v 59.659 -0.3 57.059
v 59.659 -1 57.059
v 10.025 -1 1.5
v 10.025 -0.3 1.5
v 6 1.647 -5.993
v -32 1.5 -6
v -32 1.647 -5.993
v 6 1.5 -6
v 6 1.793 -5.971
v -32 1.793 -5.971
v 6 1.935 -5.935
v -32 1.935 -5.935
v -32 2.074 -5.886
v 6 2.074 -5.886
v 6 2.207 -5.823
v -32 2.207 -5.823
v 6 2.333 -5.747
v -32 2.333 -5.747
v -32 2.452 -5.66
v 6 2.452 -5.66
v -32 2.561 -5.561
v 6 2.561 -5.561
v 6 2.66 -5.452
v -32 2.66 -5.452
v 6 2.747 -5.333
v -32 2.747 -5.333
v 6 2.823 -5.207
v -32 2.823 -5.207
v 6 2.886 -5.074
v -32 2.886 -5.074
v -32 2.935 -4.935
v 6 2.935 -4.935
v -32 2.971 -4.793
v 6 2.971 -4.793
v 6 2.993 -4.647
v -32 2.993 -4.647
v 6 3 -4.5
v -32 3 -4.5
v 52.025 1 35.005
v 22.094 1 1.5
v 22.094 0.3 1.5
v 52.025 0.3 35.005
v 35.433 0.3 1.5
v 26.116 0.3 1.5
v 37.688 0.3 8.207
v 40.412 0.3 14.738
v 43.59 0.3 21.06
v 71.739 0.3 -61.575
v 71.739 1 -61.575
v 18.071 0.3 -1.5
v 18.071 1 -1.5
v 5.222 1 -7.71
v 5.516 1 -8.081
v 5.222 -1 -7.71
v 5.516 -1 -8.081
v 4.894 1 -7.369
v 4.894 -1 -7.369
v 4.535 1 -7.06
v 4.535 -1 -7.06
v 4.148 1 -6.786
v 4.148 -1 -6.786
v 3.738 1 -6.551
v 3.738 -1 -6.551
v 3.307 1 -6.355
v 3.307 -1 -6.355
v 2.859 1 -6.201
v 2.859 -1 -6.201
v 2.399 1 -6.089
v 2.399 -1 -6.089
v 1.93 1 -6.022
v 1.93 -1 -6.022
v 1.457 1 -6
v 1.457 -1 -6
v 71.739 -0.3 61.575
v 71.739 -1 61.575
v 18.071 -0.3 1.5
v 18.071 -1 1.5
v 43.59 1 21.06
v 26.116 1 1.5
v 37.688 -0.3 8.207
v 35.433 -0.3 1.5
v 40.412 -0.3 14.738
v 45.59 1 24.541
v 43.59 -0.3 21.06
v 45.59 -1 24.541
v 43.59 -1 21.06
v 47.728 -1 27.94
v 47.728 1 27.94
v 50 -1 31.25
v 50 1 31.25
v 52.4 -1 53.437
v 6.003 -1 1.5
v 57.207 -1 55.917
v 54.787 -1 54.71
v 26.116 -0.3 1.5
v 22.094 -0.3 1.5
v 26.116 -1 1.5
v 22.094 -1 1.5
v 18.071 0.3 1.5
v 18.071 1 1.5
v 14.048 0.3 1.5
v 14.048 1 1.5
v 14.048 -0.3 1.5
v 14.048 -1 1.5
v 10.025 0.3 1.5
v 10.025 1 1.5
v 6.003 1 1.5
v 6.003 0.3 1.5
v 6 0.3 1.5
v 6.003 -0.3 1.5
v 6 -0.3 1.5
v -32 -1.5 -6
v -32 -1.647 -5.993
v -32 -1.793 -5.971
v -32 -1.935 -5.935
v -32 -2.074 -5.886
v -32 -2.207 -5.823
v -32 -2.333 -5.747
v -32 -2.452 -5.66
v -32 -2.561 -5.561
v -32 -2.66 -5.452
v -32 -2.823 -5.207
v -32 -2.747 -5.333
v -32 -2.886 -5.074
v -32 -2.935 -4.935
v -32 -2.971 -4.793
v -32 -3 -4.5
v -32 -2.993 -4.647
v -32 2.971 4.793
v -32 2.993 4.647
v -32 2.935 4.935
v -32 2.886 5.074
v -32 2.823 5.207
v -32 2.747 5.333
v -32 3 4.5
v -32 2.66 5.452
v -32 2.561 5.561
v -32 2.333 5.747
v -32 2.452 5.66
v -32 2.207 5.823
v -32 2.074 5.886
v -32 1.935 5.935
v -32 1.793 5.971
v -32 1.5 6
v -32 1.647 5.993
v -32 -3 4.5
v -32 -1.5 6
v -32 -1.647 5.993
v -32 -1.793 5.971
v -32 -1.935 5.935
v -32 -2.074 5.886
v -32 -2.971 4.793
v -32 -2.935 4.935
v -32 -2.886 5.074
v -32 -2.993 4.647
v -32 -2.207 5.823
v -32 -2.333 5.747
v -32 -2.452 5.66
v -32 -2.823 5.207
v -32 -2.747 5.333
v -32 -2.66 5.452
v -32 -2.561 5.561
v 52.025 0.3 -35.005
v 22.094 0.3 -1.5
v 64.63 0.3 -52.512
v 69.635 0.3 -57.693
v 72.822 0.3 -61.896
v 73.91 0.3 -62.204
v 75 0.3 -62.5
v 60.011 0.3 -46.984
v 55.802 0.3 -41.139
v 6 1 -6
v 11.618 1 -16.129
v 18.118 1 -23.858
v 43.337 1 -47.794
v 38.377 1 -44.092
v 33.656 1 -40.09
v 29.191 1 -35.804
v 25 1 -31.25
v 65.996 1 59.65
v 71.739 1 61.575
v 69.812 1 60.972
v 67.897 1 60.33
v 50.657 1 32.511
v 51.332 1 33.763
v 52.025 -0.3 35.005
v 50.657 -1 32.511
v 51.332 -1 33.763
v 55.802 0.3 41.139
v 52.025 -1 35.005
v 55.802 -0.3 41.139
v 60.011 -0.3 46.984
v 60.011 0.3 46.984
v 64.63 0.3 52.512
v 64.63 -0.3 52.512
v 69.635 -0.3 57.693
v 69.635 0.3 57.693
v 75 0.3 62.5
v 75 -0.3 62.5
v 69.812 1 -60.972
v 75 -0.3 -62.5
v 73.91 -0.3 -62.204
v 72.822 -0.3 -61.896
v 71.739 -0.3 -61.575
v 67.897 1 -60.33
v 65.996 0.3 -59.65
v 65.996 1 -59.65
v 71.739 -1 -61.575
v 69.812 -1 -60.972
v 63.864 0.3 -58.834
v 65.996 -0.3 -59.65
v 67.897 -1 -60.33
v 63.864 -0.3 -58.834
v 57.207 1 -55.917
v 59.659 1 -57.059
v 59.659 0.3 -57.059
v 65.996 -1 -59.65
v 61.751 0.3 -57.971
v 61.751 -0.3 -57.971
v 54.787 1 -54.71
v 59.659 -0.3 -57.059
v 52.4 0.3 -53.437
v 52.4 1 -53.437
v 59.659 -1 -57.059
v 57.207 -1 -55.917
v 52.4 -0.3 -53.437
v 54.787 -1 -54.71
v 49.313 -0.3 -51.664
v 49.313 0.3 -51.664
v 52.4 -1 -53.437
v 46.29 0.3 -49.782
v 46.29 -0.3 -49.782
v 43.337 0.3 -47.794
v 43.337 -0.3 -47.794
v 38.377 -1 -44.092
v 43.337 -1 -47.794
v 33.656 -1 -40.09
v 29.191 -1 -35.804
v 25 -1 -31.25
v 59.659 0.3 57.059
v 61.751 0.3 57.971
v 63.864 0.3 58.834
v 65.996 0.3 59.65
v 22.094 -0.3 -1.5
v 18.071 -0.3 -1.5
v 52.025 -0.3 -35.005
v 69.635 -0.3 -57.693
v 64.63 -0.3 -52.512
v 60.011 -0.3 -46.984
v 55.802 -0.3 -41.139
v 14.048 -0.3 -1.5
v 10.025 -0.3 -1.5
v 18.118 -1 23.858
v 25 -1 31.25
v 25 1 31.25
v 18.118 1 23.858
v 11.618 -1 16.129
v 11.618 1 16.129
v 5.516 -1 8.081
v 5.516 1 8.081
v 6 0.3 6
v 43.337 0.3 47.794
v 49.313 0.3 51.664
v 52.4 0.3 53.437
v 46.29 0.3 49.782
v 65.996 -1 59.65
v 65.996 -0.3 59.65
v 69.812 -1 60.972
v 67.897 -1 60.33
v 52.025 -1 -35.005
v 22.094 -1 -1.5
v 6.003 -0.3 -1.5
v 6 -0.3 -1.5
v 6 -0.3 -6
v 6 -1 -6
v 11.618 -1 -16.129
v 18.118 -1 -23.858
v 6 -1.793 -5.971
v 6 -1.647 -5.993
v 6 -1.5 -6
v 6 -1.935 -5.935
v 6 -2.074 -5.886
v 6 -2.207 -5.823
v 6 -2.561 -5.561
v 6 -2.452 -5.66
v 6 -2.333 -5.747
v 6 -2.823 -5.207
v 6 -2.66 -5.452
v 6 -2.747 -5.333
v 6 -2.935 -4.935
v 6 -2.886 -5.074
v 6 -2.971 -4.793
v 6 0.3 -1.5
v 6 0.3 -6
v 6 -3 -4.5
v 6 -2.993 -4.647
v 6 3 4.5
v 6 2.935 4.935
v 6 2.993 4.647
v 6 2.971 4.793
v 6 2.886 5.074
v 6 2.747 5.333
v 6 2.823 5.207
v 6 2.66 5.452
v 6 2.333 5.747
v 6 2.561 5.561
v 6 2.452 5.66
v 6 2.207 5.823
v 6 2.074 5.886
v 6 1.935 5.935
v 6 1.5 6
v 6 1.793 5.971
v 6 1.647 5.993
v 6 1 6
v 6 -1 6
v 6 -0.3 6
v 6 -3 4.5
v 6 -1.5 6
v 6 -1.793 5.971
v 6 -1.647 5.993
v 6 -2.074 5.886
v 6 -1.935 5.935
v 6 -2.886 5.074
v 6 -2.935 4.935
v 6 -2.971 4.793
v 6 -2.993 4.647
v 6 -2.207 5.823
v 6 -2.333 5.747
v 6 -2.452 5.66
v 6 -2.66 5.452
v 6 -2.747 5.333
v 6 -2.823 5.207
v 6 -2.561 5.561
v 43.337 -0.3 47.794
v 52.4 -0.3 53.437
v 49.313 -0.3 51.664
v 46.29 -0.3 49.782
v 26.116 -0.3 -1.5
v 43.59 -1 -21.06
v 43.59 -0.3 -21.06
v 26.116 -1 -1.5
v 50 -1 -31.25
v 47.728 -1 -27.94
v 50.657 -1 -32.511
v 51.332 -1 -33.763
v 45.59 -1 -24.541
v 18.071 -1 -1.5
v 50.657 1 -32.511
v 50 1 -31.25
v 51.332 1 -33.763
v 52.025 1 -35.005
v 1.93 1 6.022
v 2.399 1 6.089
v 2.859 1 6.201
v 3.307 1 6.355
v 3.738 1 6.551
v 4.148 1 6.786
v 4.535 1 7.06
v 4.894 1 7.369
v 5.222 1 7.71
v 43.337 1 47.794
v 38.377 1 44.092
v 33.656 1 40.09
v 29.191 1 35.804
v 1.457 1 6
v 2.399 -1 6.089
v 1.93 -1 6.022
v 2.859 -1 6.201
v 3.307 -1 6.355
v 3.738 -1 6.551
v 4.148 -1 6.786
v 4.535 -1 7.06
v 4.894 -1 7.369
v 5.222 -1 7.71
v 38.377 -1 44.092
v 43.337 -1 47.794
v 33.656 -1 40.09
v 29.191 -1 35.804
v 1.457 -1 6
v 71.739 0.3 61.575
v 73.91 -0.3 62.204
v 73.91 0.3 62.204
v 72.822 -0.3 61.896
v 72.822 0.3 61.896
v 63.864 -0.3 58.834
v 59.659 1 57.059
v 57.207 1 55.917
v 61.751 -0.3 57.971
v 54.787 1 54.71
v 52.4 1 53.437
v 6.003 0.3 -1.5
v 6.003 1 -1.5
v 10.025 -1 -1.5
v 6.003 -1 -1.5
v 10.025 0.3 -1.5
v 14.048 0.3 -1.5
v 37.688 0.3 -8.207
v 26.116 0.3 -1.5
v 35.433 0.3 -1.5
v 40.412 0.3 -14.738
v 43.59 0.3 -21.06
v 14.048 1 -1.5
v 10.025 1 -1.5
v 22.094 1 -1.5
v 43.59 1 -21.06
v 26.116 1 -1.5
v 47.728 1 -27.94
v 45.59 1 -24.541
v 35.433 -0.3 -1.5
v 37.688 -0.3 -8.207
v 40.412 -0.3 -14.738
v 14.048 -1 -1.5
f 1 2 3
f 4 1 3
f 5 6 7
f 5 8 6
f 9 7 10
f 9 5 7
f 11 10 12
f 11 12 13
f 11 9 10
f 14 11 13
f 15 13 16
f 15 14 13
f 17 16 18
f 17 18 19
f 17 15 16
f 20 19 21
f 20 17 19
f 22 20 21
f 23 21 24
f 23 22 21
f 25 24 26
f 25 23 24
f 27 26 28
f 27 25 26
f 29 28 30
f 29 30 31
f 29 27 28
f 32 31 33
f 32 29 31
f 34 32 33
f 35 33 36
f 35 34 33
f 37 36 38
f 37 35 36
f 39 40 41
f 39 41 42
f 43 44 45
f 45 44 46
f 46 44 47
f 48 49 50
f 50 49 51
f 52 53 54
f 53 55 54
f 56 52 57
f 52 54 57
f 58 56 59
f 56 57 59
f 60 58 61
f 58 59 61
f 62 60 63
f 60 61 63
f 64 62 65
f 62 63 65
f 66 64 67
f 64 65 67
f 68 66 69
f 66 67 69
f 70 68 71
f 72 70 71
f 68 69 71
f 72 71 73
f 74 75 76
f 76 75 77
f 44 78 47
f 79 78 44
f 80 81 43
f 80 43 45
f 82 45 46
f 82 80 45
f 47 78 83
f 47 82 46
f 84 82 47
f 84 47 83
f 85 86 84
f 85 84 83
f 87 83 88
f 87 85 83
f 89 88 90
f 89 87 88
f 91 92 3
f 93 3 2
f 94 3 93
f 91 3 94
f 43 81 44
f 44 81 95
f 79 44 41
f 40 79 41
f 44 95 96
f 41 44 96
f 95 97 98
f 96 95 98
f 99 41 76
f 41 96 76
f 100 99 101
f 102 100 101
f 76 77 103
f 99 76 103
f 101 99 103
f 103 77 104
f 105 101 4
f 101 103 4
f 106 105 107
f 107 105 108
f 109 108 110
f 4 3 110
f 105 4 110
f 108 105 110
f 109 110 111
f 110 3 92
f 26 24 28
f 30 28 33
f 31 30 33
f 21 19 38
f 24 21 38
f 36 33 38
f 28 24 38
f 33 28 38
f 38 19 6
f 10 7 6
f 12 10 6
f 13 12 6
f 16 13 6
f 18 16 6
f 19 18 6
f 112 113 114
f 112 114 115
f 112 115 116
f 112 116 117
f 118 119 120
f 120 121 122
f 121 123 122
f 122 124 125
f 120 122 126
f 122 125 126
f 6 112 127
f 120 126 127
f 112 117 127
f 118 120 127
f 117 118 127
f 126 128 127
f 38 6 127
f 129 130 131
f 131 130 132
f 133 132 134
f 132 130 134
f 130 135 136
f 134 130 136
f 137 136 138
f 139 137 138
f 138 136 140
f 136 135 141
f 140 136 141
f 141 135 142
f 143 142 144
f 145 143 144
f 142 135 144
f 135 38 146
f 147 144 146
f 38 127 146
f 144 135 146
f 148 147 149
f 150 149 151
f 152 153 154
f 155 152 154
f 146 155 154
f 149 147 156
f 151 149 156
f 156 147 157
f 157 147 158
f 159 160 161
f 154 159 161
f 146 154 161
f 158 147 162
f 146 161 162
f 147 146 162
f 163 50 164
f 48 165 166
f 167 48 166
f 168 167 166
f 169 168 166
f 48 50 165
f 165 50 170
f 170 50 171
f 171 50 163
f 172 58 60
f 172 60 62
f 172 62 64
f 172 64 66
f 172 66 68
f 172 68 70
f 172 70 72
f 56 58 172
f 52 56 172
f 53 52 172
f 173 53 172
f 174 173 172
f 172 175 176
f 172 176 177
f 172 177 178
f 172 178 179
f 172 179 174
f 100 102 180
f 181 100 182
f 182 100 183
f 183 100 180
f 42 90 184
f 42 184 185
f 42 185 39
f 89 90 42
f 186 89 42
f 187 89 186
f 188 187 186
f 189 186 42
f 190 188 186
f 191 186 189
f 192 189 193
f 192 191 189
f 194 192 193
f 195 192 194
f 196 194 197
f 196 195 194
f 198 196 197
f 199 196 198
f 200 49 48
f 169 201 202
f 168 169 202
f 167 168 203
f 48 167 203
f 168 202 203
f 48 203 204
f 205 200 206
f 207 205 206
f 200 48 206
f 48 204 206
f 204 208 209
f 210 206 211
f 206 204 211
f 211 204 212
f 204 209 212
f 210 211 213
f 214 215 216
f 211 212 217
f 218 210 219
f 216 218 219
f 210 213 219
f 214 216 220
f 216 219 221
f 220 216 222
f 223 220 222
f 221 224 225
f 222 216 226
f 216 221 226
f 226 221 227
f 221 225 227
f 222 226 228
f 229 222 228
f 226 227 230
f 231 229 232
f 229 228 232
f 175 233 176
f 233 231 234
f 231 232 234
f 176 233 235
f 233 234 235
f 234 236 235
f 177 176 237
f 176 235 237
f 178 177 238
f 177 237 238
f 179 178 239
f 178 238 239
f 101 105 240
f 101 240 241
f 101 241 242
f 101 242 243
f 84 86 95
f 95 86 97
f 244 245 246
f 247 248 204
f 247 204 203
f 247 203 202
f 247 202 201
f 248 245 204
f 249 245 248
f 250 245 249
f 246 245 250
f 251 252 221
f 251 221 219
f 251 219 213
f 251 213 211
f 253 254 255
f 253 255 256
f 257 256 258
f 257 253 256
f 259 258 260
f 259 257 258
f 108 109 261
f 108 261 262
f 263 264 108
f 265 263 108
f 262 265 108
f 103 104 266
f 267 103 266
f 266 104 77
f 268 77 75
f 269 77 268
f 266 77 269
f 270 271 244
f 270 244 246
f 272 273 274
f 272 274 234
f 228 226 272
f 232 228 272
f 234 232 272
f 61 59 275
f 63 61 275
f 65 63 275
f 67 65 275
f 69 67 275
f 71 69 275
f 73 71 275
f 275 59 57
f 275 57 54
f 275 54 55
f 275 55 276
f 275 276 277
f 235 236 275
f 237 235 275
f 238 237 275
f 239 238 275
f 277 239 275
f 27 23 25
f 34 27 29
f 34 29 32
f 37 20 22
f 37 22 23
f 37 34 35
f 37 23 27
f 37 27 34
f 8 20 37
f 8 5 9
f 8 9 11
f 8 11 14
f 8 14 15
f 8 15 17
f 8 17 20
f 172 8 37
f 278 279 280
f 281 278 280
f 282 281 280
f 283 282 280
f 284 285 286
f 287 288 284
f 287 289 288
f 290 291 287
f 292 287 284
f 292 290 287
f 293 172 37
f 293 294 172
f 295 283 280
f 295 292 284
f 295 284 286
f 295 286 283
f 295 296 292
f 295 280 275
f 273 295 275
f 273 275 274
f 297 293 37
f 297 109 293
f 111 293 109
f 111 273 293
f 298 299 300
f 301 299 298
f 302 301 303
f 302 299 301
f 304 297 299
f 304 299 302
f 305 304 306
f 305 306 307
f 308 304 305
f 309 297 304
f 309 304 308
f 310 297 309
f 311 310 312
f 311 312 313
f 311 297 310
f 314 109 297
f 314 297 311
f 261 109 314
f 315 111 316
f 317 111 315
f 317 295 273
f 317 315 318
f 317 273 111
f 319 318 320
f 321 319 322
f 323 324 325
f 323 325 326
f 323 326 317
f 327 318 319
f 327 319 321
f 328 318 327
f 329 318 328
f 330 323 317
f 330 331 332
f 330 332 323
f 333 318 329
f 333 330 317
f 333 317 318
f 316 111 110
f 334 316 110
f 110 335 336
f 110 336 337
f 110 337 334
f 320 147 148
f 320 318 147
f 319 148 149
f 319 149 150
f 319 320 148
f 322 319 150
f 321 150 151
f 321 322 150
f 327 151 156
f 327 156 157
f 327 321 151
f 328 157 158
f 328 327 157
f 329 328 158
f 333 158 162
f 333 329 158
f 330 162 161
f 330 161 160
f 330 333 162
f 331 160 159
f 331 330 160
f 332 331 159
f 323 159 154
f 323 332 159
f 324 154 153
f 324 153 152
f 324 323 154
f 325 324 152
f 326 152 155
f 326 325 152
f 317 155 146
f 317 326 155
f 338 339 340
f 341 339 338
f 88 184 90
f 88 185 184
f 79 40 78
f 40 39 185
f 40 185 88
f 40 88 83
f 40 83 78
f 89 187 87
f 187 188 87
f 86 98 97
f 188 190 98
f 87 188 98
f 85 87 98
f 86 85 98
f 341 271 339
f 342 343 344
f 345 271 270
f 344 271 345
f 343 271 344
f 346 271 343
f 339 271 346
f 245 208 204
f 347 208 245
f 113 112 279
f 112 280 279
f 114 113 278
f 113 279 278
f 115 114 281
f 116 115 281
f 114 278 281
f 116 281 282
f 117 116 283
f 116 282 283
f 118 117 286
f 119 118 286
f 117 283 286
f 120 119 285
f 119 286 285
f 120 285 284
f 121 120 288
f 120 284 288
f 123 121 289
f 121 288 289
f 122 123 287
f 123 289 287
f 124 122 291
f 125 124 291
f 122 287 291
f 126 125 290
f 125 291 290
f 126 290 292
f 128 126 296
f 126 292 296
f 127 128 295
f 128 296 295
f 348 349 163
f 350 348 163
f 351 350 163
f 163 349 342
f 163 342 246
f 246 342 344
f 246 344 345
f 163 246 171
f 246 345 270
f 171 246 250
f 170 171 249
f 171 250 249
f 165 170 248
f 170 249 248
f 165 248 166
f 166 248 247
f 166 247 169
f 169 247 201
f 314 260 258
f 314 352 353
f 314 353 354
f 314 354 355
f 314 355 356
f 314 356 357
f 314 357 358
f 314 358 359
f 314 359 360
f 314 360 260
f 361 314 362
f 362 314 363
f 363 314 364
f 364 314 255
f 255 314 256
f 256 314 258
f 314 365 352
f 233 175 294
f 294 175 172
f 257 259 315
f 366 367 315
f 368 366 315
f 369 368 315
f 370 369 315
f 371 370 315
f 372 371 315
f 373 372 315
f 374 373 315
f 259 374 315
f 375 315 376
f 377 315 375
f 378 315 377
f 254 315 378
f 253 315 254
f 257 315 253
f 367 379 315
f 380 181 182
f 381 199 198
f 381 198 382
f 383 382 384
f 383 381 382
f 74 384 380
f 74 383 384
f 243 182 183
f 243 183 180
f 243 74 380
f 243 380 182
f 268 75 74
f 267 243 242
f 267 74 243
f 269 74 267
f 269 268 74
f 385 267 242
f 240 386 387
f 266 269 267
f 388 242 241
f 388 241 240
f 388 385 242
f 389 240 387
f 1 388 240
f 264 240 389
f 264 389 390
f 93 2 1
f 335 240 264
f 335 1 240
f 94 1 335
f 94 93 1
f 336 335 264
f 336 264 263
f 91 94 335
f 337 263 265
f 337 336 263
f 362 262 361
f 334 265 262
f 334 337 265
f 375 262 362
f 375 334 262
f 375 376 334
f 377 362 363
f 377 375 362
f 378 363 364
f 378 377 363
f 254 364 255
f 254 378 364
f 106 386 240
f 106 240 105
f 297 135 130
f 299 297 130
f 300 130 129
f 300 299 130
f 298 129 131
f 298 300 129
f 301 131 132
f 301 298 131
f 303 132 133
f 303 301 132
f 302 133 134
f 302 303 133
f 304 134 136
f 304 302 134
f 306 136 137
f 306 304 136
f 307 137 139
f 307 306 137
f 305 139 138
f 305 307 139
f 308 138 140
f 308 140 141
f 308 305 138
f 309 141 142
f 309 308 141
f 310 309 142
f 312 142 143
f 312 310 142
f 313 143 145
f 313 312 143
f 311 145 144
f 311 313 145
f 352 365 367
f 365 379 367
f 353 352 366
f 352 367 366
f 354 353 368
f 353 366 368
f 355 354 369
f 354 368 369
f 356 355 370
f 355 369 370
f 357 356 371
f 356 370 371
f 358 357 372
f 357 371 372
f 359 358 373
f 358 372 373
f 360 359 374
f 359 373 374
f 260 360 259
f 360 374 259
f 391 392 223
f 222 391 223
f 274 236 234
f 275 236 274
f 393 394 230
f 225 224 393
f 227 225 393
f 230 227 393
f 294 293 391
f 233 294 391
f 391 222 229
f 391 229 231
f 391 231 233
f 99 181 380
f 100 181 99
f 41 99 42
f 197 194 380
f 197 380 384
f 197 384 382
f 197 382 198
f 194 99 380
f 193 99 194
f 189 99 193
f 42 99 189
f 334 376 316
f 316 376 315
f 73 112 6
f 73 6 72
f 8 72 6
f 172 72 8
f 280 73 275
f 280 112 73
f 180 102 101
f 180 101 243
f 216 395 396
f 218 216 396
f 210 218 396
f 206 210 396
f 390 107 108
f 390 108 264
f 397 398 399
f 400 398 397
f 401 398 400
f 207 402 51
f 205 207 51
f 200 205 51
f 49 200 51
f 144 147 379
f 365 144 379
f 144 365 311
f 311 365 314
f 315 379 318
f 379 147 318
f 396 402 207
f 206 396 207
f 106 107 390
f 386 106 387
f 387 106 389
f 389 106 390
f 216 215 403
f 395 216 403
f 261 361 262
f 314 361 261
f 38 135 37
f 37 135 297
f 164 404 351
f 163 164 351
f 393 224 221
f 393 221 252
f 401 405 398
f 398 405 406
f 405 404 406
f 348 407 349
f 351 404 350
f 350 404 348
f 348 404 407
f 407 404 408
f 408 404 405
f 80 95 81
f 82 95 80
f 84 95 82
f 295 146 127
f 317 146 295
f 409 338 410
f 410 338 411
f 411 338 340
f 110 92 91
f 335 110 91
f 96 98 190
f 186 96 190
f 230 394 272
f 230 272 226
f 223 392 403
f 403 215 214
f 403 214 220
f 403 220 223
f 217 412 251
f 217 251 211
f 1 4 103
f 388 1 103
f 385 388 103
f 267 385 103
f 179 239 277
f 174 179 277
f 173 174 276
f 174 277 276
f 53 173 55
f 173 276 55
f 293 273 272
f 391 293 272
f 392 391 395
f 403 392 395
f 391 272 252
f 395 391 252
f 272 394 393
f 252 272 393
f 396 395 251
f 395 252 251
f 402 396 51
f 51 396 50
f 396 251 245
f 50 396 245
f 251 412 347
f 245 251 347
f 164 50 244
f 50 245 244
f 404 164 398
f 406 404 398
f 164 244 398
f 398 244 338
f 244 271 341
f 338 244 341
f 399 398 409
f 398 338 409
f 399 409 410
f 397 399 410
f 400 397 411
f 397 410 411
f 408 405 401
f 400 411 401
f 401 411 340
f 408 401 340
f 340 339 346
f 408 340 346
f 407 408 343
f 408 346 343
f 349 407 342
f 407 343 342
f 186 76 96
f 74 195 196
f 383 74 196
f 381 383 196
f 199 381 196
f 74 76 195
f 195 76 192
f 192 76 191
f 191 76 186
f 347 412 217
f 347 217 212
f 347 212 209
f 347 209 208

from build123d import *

# Parameters (mm, degrees)
F1_DEPTH         = 1
F3_W             = 38
F3_H             = 12
F4_DEPTH         = 3
F5_R             = 1.5
F7_DEPTH         = 0.7
F7_COPIES2_COUNT = 2
F9_DEPTH         = 12.5
F10_R            = 5


# Not quite as in the source:
# - a pattern or mirror of a feature is missing from the dataset's text; its kind, count and spacing are read off the source's solid


with BuildPart() as f1:
    # F0 (on Front) → F1 (new body, symmetric)
    with BuildSketch(Plane.XZ):
        with BuildLine():
            ThreePointArc((25, 31.25), (11.7164027855, 16.2518777716), (0, 0))
            Line((0, 0), (35, 0))
            ThreePointArc((35, 0), (41.1356304071, 16.2798974046), (50, 31.25))
            Line((50, 31.25), (25, 31.25))
        make_face()
        with BuildLine():
            ThreePointArc((75, 62.5), (47.6444357815, 50.6439027497), (25, 31.25))
            Line((25, 31.25), (50, 31.25))
            ThreePointArc((50, 31.25), (60.9207680237, 48.138385581), (75, 62.5))
        make_face()
    extrude(amount=F1_DEPTH, both=True)

    # F2: F1 across plane


with BuildPart() as f1_1:
    add(f1.part)
    add(f1.part.mirror(Plane.XY))

    # F3 (on Front) → F4 (join, symmetric)
    with BuildSketch(Plane.XZ):
        with Locations((-13, 0)):
            Rectangle(F3_W, F3_H)
    extrude(amount=F4_DEPTH, both=True)

    # F5
    f5_edges = [f1_1.edges().sort_by_distance(p)[0] for p in [
        (-13, 3, 6),
        (-13, -3, 6),
        (-13, -3, -6),
        (-13, 3, -6),
    ]]
    fillet(f5_edges, radius=F5_R)

    # F6 (on face) → F7 (cut)
    with BuildSketch(Plane.XZ.offset(1)):
        with BuildLine():
            Line((43.3365657685, 47.794180243), (6, 6))
            Line((6, 6), (6, 1.5))
            Line((6, 1.5), (6.0027095677, 1.5))
            Line((6.0027095677, 1.5), (52.4002239395, 53.436915958))
            ThreePointArc((52.4002239395, 53.436915958), (47.7930343948, 50.7365960242), (43.3365657685, 47.794180243))
        make_face()
        with BuildLine():
            ThreePointArc((65.9958136081, 59.6496176381), (62.8051828619, 58.40863879), (59.6589001751, 57.0591728532))
            Line((59.6589001751, 57.0591728532), (10.0254655864, 1.5))
            Line((10.0254655864, 1.5), (14.0482216051, 1.5))
            Line((14.0482216051, 1.5), (65.9958136081, 59.6496176381))
        make_face()
        with BuildLine():
            ThreePointArc((75, 62.5), (73.3655345805, 62.0514906305), (71.738905371, 61.5753443538))
            Line((71.738905371, 61.5753443538), (18.0709776237, 1.5))
            Line((18.0709776237, 1.5), (22.0937336424, 1.5))
            Line((22.0937336424, 1.5), (52.0251632611, 35.0049445138))
            ThreePointArc((52.0251632611, 35.0049445138), (62.2710885073, 49.7898624827), (75, 62.5))
        make_face()
        with BuildLine():
            Line((43.5901115949, 21.0597985398), (26.1164896611, 1.5))
            Line((26.1164896611, 1.5), (35.4331656898, 1.5))
            ThreePointArc((35.4331656898, 1.5), (38.9920250058, 11.4965917024), (43.5901115949, 21.0597985398))
        make_face()
    f7 = extrude(amount=-F7_DEPTH, mode=Mode.SUBTRACT)

    # F7_copies: F7 across plane
    add(f7.mirror(Plane.ZX), mode=Mode.SUBTRACT)

    # F7_copies1: F7 across plane
    add(f7.mirror(Plane(origin=(0, 0, 0), x_dir=(-1, 0, 0), z_dir=(0, 0, -1))), mode=Mode.SUBTRACT)

    # F7_copies2: F7 ×2 about axis
    f7_copies2_axis = Axis((0, 0, 0), (1, 0, 0))
    for i in range(1, F7_COPIES2_COUNT):
        add(f7.rotate(f7_copies2_axis, i * 360 / F7_COPIES2_COUNT), mode=Mode.SUBTRACT)

    # F8 (on face) → F9 (cut, symmetric)
    with BuildSketch(Plane.XZ.offset(1)):
        with BuildLine():
            Line((6.0027095677, 1.5), (6, 1.5))
            Line((6, 1.5), (6, -1.5))
            Line((6, -1.5), (6.0027095677, -1.5))
            Line((6.0027095677, -1.5), (10.0254655864, -1.5))
            Line((10.0254655864, -1.5), (14.0482216051, -1.5))
            Line((14.0482216051, -1.5), (18.0709776237, -1.5))
            Line((18.0709776237, -1.5), (22.0937336424, -1.5))
            Line((22.0937336424, -1.5), (26.1164896611, -1.5))
            Line((26.1164896611, -1.5), (35.4331656898, -1.5))
            ThreePointArc((35.4331656898, -1.5), (35.2136553779, -0.7508453855), (35, 0))
            ThreePointArc((35, 0), (35.2136553779, 0.7508453855), (35.4331656898, 1.5))
            Line((35.4331656898, 1.5), (26.1164896611, 1.5))
            Line((26.1164896611, 1.5), (22.0937336424, 1.5))
            Line((22.0937336424, 1.5), (18.0709776237, 1.5))
            Line((18.0709776237, 1.5), (14.0482216051, 1.5))
            Line((14.0482216051, 1.5), (10.0254655864, 1.5))
            Line((10.0254655864, 1.5), (6.0027095677, 1.5))
        make_face()
    extrude(amount=F9_DEPTH, both=True, mode=Mode.SUBTRACT)

    # F10
    f10_edges = [f1_1.edges().sort_by_distance(p)[0] for p in [
        (4.040045, 0, 6),
        (4.040045, 0, -6),
    ]]
    fillet(f10_edges, radius=F10_R)


solid = f1_1.part
